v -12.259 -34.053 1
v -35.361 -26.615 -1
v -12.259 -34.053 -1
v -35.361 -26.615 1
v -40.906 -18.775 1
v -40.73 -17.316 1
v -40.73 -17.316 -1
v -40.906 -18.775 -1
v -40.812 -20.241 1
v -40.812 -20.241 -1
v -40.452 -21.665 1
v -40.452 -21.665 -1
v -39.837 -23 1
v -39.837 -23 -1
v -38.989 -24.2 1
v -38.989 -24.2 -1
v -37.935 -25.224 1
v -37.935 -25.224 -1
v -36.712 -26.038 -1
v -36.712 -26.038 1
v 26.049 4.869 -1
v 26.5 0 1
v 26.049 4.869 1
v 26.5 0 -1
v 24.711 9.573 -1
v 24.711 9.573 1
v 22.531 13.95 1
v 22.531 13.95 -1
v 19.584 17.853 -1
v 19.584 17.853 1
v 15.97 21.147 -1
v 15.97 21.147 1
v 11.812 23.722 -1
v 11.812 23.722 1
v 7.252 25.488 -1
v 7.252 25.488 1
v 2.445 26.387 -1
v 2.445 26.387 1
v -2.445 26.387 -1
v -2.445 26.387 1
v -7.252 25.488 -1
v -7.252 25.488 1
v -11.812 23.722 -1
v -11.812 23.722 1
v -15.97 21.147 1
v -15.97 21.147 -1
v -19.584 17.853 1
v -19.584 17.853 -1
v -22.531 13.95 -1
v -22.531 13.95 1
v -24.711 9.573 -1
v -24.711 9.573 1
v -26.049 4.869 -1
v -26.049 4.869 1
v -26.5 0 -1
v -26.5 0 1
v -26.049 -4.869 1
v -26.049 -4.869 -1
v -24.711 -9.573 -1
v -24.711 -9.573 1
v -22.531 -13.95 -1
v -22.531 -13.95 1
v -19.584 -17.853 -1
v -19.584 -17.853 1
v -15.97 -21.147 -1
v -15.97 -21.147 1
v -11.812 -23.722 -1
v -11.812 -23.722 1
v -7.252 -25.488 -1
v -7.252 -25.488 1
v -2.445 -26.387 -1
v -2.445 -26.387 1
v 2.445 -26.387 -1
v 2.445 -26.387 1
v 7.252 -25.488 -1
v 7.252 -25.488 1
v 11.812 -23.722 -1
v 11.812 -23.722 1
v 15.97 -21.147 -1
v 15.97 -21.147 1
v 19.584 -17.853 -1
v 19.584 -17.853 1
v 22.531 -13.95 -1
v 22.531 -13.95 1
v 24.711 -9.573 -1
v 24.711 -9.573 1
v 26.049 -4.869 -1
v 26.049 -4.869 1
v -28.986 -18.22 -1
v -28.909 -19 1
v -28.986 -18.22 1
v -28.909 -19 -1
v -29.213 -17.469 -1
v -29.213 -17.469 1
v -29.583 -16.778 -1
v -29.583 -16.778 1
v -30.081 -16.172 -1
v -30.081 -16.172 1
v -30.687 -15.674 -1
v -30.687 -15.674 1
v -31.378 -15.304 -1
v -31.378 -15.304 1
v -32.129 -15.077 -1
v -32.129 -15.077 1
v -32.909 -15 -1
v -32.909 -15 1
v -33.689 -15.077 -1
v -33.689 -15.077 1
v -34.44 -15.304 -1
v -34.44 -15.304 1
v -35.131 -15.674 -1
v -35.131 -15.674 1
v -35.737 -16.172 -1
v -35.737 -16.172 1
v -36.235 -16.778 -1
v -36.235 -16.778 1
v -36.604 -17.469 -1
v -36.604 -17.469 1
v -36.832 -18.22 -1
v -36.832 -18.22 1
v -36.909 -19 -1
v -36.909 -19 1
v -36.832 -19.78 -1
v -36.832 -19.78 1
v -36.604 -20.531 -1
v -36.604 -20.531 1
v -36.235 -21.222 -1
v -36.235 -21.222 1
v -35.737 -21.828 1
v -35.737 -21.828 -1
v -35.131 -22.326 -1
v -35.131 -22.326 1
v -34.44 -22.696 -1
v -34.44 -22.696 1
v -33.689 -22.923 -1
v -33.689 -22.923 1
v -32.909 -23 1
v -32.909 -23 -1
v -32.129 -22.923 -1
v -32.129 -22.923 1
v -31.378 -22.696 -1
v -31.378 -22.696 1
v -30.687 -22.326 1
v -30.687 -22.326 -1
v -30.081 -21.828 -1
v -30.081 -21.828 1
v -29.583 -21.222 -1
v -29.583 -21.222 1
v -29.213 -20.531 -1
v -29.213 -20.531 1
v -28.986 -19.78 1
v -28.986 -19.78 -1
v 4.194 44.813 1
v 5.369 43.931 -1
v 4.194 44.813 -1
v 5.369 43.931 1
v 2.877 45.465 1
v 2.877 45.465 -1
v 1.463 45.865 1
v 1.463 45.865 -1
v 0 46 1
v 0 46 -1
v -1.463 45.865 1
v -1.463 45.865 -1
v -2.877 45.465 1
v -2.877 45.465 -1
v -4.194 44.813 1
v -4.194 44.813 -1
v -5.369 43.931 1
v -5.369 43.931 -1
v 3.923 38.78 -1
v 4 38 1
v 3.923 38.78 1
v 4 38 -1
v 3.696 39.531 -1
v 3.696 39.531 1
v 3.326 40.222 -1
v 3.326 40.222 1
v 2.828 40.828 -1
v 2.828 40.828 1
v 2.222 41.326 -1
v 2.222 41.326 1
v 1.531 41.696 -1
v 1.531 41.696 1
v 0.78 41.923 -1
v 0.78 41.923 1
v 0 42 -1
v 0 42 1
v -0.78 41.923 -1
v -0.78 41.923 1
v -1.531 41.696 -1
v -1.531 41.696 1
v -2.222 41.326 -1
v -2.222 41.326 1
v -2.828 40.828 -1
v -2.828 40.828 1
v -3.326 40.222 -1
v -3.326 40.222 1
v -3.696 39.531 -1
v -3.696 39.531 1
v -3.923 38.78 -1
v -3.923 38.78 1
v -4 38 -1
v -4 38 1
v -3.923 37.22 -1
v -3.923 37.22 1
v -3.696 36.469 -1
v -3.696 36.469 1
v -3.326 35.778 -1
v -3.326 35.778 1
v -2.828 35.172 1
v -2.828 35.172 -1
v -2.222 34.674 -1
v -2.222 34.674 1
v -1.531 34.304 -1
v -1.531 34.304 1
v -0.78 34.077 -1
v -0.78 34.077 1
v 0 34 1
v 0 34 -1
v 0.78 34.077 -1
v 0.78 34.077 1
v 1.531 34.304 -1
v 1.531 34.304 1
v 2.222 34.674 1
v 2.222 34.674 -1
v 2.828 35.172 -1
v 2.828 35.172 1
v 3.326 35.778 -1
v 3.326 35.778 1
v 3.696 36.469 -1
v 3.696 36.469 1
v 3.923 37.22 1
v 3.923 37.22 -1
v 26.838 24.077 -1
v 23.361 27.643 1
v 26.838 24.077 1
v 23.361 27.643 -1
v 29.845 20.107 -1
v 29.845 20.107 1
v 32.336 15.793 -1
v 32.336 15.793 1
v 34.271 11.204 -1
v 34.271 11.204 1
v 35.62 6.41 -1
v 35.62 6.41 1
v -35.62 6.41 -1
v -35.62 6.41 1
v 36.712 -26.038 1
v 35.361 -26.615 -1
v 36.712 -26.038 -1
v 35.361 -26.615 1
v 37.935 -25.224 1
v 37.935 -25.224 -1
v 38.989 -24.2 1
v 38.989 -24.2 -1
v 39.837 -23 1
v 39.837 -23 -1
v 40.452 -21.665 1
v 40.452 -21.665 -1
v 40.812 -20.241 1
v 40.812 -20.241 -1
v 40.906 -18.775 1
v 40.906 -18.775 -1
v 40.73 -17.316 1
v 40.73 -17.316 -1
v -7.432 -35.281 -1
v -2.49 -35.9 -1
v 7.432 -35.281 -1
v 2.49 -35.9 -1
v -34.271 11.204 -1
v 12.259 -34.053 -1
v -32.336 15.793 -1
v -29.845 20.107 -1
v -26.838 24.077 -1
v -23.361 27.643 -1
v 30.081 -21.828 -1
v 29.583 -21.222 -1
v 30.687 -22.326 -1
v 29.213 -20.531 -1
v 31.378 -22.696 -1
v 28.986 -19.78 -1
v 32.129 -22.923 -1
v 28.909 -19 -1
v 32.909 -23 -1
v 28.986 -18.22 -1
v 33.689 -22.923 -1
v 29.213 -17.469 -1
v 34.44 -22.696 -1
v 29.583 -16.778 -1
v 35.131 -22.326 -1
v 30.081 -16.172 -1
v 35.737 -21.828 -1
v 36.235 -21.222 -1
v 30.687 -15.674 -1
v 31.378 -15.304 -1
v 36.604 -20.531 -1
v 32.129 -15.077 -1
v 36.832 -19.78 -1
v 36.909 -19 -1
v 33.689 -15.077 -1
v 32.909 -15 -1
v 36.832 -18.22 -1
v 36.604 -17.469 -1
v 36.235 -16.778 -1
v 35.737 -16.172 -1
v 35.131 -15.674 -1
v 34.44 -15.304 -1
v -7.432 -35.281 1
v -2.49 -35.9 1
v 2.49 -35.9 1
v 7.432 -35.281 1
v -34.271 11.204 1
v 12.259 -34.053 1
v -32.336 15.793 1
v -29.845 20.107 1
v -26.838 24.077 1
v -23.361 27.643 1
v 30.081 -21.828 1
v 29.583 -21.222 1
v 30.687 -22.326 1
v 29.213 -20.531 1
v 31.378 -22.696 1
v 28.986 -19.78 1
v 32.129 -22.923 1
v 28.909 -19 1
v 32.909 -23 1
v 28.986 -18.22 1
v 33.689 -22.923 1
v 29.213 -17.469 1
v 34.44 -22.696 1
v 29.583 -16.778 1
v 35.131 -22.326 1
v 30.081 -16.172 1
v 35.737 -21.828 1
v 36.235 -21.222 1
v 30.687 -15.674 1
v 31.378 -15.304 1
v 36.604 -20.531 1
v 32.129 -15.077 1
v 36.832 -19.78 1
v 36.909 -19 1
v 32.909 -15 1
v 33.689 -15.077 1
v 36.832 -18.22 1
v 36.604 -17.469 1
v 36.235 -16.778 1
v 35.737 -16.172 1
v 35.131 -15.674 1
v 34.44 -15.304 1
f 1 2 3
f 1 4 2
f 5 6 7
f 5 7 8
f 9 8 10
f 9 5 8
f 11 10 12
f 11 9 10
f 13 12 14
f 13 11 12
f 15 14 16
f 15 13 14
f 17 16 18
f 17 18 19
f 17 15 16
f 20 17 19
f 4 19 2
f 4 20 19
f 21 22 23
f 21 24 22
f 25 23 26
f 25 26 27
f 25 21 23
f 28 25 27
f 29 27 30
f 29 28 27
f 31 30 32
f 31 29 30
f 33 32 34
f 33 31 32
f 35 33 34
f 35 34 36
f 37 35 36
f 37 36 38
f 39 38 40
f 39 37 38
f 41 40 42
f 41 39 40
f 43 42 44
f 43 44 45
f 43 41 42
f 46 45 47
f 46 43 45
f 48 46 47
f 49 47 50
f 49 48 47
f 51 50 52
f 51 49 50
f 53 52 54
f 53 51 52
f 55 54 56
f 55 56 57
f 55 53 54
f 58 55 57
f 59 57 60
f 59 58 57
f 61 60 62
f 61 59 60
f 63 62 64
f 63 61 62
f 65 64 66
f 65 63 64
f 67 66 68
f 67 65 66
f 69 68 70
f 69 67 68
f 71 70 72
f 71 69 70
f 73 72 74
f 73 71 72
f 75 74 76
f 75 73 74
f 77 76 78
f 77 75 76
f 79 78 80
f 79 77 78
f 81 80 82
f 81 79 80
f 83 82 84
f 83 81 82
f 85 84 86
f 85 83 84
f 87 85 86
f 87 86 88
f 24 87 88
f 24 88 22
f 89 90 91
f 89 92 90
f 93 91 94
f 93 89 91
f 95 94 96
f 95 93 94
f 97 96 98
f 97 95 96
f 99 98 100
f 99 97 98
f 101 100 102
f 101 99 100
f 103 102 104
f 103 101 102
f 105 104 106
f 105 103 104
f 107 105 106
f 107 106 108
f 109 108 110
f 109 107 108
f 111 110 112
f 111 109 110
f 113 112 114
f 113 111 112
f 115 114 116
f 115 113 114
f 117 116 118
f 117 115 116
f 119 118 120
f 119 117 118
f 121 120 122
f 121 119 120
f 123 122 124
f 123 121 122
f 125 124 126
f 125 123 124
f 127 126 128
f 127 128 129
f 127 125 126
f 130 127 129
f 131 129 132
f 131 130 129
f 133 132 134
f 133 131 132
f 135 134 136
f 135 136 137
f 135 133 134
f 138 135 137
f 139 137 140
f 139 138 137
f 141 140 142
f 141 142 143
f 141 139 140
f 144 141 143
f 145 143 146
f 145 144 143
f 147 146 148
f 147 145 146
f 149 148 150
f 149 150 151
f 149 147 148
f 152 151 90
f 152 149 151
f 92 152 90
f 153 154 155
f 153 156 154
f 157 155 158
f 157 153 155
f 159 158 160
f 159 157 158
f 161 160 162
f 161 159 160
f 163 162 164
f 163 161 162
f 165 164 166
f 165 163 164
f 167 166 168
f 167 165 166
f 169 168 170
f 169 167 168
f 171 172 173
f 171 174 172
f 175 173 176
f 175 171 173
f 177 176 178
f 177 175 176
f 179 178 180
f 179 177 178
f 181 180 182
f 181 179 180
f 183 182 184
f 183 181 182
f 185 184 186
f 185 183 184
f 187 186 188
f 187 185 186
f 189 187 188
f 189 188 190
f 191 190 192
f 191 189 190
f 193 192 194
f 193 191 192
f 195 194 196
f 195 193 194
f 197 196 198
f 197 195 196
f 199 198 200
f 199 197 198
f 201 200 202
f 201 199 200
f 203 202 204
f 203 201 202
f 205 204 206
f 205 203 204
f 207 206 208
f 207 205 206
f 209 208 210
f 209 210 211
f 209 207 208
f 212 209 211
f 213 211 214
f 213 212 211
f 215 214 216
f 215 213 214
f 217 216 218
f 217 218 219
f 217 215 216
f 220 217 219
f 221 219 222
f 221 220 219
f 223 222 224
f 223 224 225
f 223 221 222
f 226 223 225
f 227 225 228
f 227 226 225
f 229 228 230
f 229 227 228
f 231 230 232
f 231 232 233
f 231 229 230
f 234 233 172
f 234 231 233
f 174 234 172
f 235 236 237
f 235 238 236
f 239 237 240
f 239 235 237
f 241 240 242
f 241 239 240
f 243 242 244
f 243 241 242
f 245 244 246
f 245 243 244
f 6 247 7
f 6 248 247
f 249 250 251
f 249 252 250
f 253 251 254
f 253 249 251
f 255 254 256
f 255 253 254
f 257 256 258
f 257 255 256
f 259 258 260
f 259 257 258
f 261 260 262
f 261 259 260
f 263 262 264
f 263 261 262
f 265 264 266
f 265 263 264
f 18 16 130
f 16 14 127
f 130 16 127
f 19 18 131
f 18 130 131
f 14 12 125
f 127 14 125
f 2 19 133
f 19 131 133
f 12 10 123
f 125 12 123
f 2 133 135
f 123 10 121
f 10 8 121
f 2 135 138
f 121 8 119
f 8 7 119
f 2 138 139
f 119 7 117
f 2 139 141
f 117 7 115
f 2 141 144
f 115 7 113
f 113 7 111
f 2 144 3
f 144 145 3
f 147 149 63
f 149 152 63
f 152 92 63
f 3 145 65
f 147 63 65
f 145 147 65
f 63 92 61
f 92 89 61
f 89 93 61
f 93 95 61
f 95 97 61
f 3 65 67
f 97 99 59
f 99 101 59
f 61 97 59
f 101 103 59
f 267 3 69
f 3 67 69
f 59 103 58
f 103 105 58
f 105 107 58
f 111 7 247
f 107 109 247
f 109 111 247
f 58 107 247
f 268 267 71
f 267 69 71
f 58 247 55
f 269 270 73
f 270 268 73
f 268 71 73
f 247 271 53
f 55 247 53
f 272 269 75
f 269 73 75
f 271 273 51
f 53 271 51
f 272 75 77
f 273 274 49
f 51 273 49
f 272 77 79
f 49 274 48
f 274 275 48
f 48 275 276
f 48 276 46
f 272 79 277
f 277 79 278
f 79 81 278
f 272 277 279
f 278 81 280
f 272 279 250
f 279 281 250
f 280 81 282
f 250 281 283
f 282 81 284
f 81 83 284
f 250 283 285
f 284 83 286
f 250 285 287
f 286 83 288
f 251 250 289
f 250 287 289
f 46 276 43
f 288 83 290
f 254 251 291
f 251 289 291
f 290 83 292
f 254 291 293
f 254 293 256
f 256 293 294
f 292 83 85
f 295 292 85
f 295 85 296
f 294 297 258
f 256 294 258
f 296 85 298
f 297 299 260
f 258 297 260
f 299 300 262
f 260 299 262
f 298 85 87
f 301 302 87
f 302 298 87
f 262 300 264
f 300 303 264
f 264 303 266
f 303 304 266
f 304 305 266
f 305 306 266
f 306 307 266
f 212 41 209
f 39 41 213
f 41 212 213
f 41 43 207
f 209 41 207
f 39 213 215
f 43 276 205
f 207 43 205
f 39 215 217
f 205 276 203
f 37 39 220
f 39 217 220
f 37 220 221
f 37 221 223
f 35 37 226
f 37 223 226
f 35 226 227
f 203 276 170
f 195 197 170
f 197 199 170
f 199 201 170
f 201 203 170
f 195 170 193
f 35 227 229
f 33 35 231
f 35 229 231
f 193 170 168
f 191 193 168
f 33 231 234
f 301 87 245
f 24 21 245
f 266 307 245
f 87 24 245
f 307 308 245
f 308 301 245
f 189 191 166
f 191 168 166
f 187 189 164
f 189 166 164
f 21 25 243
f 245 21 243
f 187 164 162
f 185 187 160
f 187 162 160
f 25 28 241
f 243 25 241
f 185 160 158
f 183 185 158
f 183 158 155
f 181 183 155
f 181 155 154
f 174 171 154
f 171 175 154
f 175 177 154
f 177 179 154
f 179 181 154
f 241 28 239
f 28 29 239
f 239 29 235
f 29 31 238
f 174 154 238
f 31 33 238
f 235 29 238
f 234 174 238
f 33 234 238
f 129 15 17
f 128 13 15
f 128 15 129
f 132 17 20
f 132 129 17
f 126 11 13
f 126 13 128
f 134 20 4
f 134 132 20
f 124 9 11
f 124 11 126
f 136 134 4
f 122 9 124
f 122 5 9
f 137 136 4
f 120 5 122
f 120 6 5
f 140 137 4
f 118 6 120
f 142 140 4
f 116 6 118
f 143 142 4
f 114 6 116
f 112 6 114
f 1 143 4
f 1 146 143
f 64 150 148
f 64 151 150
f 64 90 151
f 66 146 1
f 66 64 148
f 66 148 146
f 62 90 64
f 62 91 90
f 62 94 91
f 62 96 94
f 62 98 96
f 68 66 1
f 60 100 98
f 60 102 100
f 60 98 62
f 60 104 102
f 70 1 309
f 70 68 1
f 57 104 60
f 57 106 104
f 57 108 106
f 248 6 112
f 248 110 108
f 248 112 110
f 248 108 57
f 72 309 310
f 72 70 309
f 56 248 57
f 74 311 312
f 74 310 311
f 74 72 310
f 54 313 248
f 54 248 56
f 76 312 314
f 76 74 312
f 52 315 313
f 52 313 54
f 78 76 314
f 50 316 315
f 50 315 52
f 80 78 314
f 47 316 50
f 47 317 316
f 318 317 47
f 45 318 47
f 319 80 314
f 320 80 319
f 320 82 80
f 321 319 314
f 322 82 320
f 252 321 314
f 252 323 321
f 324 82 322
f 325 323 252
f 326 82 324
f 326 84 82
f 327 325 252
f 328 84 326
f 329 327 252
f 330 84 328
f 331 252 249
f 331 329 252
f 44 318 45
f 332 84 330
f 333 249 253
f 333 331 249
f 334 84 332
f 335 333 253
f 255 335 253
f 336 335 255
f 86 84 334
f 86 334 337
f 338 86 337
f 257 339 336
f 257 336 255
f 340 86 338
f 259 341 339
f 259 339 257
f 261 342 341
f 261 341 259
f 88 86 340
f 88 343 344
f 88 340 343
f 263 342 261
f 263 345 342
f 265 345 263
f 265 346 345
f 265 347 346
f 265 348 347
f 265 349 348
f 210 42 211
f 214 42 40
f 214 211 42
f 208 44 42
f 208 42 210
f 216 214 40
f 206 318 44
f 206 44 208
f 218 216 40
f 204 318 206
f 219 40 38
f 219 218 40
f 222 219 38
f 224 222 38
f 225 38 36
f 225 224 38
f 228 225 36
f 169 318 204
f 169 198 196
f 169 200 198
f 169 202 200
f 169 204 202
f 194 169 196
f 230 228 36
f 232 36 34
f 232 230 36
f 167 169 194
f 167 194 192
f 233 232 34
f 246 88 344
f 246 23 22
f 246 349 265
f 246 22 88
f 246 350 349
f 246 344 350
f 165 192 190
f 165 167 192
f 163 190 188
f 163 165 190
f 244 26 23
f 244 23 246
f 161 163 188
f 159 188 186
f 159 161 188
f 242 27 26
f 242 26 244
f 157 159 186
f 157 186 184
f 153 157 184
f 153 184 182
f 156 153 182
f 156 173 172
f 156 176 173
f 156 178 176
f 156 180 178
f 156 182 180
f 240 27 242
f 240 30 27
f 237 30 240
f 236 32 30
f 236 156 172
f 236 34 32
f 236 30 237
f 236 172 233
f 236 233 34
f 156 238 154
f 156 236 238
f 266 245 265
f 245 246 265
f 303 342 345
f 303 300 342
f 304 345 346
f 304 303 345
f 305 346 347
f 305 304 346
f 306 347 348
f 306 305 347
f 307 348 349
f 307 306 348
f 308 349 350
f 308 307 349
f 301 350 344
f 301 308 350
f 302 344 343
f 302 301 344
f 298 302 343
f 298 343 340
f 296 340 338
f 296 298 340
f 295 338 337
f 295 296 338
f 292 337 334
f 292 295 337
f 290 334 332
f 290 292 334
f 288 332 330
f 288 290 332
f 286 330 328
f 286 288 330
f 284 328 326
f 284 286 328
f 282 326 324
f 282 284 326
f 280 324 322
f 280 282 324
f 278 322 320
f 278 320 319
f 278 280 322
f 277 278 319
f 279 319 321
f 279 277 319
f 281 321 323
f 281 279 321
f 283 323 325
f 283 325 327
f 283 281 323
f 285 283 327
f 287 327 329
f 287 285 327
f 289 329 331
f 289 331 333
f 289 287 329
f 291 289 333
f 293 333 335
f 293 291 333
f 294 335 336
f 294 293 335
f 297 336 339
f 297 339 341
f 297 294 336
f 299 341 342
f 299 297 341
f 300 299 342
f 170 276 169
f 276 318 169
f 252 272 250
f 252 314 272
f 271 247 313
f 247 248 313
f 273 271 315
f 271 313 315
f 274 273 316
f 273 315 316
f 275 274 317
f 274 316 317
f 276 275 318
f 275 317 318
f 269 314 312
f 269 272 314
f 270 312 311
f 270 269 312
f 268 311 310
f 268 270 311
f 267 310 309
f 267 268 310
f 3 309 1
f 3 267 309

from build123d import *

# Parameters (mm, degrees)
SKETCH_R   = 26.5
SKETCH_R_2 = 4
PAD_DEPTH  = 1
FILLET_R   = 40


with BuildPart() as part:
    # Sketch → Pad (new body, symmetric)
    with BuildSketch(Plane.XY):
        with BuildLine():
            ThreePointArc((5.368922, 43.930824), (0, 46), (-5.368922, 43.930824))
            Line((-32.908965, 19), (-5.368922, 43.930824))
            Line((-32.908965, 19), (-40.729671, -17.315789))
            ThreePointArc((-40.729671, -17.315789), (-39.837169, -23), (-35.360749, -26.615035))
            Line((-35.360749, -26.615035), (0, -38))
            Line((0, -38), (35.360749, -26.615035))
            ThreePointArc((35.360749, -26.615035), (39.837169, -23), (40.729671, -17.315789))
            Line((32.908965, 19), (40.729671, -17.315789))
            Line((32.908965, 19), (5.368922, 43.930824))
        make_face()
        Circle(SKETCH_R, mode=Mode.SUBTRACT)
        with Locations((0, 38)):
            Circle(SKETCH_R_2, mode=Mode.SUBTRACT)
        with Locations((32.908965, -19)):
            Circle(SKETCH_R_2, mode=Mode.SUBTRACT)
        with Locations((-32.908965, -19)):
            Circle(SKETCH_R_2, mode=Mode.SUBTRACT)
    extrude(amount=PAD_DEPTH, both=True)

    # Fillet
    fillet_edges = [part.edges().sort_by_distance(p)[0] for p in [
        (32.908965, 19, 0),
        (0, -38, 0),
        (-32.908965, 19, 0),
    ]]
    fillet(fillet_edges, radius=FILLET_R)


solid = part.part
